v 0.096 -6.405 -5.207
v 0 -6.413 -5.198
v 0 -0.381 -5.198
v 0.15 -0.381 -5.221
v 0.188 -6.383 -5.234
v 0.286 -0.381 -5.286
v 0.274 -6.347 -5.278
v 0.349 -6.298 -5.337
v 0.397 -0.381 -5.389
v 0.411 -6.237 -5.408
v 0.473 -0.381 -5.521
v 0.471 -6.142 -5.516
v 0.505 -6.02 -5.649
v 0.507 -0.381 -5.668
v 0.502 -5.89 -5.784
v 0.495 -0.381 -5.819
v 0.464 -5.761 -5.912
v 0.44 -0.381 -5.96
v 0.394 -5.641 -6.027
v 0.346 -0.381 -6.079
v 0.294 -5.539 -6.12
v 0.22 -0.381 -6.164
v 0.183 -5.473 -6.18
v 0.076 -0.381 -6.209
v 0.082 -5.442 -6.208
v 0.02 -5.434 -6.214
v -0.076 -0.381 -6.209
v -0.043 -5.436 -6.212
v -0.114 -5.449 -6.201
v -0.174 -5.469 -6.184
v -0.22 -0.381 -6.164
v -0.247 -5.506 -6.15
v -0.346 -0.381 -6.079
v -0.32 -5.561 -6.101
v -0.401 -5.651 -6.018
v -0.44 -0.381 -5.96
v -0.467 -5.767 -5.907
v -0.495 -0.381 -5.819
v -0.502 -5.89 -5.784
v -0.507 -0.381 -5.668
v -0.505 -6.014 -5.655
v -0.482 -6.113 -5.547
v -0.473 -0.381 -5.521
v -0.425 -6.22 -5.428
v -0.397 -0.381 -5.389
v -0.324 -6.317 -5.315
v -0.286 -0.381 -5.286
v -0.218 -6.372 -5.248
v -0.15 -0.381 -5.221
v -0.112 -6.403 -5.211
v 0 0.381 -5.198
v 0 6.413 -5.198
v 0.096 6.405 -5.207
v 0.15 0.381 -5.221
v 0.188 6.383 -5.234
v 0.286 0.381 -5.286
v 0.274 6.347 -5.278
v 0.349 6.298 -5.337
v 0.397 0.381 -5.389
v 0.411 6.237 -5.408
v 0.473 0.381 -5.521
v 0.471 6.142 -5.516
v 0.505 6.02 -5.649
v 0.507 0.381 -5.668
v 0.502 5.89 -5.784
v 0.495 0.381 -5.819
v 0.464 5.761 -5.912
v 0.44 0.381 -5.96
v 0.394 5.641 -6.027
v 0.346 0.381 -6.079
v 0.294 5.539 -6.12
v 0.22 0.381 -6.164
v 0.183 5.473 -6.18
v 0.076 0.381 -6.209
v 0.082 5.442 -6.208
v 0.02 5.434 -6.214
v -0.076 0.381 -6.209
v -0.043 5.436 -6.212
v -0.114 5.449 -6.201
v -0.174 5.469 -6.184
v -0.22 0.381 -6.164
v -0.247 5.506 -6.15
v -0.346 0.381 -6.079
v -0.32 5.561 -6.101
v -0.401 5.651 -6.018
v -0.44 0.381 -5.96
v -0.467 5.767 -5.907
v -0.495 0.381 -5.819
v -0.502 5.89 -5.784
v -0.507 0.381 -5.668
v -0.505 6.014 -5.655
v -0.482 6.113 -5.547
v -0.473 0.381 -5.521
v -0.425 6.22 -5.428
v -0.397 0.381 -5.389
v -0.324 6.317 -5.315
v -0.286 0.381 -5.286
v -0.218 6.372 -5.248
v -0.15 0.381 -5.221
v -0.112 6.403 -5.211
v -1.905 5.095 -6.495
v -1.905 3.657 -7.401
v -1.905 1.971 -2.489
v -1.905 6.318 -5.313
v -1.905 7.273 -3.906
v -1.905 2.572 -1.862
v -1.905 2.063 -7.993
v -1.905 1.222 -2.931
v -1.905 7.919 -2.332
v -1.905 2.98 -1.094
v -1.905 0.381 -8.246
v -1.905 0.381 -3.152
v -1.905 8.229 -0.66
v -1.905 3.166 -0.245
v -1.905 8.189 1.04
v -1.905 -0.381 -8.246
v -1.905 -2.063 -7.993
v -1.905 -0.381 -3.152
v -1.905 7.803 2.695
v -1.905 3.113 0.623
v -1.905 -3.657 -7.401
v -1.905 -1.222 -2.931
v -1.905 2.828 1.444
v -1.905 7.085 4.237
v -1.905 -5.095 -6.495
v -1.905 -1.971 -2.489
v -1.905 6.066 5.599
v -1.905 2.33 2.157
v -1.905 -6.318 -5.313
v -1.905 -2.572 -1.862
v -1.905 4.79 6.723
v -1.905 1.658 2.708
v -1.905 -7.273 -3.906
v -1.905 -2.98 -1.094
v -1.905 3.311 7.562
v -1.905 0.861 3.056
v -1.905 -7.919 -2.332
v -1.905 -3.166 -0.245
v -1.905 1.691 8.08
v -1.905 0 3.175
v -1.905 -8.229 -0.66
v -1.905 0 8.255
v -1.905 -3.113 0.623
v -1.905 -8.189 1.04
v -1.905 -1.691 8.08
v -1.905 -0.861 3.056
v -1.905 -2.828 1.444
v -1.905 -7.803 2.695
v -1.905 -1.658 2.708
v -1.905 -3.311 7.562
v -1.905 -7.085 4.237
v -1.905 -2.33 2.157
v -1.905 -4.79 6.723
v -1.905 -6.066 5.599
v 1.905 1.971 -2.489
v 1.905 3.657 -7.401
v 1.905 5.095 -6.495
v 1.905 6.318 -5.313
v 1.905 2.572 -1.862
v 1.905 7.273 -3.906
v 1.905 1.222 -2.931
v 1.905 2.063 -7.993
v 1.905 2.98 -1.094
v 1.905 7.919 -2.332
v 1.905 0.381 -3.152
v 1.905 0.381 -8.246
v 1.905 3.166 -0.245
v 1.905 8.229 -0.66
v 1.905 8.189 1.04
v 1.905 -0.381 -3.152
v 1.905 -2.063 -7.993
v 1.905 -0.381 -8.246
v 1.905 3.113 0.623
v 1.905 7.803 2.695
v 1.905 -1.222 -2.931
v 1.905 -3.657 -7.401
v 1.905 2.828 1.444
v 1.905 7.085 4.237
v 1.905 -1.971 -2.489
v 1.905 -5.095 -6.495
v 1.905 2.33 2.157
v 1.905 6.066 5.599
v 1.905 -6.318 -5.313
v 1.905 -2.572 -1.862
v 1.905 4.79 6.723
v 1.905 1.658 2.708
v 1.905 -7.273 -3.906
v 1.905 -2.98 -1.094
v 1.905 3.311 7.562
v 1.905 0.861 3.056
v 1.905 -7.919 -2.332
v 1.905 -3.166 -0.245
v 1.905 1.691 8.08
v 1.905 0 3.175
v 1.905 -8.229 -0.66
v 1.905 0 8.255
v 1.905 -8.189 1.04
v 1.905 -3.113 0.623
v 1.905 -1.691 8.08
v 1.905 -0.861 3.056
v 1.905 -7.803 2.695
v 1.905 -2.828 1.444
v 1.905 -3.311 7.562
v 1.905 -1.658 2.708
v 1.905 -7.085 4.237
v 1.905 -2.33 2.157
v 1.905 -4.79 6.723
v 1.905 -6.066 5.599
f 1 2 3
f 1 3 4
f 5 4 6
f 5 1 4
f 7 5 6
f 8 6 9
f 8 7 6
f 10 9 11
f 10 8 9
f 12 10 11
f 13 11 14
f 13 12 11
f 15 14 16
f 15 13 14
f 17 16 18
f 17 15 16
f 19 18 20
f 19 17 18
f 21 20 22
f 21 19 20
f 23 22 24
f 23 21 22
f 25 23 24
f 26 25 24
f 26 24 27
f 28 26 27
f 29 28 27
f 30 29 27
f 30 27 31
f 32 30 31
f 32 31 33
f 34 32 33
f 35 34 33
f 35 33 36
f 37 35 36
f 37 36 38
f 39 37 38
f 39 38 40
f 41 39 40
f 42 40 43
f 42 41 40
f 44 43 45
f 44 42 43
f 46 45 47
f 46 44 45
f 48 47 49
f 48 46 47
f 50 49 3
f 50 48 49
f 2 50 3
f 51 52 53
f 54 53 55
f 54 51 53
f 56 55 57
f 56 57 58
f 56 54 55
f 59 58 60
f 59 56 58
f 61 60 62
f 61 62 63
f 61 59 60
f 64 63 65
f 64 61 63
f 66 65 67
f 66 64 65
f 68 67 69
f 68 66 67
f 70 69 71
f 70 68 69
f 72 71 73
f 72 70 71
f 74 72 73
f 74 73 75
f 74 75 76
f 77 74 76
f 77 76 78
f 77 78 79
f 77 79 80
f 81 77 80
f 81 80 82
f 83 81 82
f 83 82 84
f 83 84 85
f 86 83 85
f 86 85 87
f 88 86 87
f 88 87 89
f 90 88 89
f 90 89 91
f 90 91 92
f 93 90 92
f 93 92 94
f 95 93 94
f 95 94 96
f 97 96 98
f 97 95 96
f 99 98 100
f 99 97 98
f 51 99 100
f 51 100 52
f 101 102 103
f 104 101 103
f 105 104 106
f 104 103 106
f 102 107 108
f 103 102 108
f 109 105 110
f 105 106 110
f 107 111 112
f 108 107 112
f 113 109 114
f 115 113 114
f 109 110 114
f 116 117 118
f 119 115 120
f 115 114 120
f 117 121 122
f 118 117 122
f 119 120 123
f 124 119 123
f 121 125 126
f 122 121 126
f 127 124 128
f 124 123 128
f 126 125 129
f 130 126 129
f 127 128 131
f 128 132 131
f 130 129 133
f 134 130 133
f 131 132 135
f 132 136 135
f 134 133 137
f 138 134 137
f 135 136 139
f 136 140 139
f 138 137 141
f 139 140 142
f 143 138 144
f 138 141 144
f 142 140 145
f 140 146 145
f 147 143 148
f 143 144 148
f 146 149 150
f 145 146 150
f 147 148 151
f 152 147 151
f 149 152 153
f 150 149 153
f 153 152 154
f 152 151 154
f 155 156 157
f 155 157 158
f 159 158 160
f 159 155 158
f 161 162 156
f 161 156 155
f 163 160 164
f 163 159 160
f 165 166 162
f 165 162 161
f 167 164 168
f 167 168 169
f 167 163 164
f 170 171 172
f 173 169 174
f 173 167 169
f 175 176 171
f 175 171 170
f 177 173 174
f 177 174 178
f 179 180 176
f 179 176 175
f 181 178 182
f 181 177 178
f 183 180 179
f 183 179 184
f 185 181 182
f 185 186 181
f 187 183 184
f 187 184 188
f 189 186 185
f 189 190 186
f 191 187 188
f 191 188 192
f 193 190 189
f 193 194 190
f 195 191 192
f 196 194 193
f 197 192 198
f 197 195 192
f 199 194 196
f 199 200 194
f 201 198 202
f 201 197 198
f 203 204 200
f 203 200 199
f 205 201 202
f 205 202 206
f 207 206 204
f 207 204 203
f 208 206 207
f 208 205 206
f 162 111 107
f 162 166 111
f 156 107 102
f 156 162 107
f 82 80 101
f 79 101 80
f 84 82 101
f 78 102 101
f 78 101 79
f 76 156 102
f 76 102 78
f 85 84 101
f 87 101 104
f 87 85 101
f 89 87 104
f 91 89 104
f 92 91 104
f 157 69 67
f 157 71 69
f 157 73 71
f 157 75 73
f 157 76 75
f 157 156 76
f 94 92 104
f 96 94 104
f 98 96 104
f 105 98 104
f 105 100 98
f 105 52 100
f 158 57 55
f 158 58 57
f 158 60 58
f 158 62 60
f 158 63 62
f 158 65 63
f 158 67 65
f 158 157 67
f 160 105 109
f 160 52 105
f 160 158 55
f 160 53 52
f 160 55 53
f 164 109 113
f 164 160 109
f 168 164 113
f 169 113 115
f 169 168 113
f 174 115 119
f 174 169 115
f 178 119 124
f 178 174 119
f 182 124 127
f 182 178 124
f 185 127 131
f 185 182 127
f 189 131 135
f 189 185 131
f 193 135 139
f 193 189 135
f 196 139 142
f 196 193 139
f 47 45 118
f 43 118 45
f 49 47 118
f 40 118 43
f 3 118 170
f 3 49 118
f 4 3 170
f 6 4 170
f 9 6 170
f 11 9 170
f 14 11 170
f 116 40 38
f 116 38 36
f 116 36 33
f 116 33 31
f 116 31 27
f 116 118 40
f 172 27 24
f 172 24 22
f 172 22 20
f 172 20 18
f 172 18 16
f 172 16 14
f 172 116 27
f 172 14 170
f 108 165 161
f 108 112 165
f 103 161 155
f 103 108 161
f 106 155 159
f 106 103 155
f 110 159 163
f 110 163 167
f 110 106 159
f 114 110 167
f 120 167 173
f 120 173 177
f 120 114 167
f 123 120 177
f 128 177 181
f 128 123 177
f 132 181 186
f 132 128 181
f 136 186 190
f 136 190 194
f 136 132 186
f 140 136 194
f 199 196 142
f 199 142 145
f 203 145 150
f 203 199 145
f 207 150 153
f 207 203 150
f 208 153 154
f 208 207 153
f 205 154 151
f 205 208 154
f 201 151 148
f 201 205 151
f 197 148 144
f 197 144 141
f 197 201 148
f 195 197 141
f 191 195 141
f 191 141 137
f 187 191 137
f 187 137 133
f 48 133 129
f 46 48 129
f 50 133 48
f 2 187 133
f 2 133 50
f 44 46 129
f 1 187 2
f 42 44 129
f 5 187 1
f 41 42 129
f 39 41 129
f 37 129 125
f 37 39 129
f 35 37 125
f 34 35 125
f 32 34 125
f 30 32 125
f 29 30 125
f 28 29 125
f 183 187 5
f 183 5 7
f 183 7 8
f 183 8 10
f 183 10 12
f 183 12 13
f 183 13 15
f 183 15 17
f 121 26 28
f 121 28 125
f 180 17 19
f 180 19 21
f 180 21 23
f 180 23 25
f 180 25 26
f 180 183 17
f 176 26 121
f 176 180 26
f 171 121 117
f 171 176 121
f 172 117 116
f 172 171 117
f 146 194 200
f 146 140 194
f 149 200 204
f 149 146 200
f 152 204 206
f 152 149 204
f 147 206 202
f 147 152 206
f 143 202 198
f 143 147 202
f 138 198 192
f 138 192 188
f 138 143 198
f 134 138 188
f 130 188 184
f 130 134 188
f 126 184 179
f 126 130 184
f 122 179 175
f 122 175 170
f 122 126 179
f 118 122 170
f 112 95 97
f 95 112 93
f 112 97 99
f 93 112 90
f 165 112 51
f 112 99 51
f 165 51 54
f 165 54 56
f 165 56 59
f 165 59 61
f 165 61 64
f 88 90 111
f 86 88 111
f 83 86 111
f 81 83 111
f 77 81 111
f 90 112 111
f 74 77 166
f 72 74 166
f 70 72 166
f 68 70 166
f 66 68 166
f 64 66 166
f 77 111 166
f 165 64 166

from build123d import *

# Parameters (mm, degrees)
SKETCH1_R               = 8.255
SKETCH1_R_2             = 3.175
BOSS_EXTRUDE1_DEPTH     = 1.905
SKETCH3_W               = 3.81
SKETCH3_H               = 8.255
CUT_EXTRUDE1_DEPTH      = 0.381
CUT_EXTRUDE2_DEPTH      = 12.828739366
CUT_EXTRUDE2_DEPTH_BACK = 12.828739366
SKETCH4_R               = 0.508


with BuildPart() as part:
    # Sketch1 → Boss-Extrude1 (new, symmetric)
    with BuildSketch(Plane(origin=(0, 0, 0), x_dir=(0, 0, -1), z_dir=(1, 0, 0))):
        with Locations(Location((0, 0, 0), (0, 0, 180))):
            Circle(SKETCH1_R)
        with Locations(Location((0, 0, 0), (0, 0, 180))):
            Circle(SKETCH1_R_2, mode=Mode.SUBTRACT)
    extrude(amount=BOSS_EXTRUDE1_DEPTH, both=True)

    # Sketch3 → Cut-Extrude1 (cut, symmetric)
    with BuildSketch(Plane(origin=(0, 0, 0), x_dir=(1, 0, 0), z_dir=(0, 1, 0))):
        with Locations((0, 4.1275)):
            Rectangle(SKETCH3_W, SKETCH3_H)
    extrude(amount=CUT_EXTRUDE1_DEPTH, both=True, mode=Mode.SUBTRACT)

    # Sketch4 → Cut-Extrude2 (cut, two sides: drawn at the far end of the back side and taken through both)
    with BuildSketch(Plane(origin=(0, 0, 0), x_dir=(1, 0, 0), z_dir=(0, 1, 0)).offset(-CUT_EXTRUDE2_DEPTH_BACK)):
        with Locations(Location((0, 5.706203005, 0), (0, 0, 270))):
            Circle(SKETCH4_R)
    extrude(amount=CUT_EXTRUDE2_DEPTH + CUT_EXTRUDE2_DEPTH_BACK, mode=Mode.SUBTRACT)


solid = part.part
